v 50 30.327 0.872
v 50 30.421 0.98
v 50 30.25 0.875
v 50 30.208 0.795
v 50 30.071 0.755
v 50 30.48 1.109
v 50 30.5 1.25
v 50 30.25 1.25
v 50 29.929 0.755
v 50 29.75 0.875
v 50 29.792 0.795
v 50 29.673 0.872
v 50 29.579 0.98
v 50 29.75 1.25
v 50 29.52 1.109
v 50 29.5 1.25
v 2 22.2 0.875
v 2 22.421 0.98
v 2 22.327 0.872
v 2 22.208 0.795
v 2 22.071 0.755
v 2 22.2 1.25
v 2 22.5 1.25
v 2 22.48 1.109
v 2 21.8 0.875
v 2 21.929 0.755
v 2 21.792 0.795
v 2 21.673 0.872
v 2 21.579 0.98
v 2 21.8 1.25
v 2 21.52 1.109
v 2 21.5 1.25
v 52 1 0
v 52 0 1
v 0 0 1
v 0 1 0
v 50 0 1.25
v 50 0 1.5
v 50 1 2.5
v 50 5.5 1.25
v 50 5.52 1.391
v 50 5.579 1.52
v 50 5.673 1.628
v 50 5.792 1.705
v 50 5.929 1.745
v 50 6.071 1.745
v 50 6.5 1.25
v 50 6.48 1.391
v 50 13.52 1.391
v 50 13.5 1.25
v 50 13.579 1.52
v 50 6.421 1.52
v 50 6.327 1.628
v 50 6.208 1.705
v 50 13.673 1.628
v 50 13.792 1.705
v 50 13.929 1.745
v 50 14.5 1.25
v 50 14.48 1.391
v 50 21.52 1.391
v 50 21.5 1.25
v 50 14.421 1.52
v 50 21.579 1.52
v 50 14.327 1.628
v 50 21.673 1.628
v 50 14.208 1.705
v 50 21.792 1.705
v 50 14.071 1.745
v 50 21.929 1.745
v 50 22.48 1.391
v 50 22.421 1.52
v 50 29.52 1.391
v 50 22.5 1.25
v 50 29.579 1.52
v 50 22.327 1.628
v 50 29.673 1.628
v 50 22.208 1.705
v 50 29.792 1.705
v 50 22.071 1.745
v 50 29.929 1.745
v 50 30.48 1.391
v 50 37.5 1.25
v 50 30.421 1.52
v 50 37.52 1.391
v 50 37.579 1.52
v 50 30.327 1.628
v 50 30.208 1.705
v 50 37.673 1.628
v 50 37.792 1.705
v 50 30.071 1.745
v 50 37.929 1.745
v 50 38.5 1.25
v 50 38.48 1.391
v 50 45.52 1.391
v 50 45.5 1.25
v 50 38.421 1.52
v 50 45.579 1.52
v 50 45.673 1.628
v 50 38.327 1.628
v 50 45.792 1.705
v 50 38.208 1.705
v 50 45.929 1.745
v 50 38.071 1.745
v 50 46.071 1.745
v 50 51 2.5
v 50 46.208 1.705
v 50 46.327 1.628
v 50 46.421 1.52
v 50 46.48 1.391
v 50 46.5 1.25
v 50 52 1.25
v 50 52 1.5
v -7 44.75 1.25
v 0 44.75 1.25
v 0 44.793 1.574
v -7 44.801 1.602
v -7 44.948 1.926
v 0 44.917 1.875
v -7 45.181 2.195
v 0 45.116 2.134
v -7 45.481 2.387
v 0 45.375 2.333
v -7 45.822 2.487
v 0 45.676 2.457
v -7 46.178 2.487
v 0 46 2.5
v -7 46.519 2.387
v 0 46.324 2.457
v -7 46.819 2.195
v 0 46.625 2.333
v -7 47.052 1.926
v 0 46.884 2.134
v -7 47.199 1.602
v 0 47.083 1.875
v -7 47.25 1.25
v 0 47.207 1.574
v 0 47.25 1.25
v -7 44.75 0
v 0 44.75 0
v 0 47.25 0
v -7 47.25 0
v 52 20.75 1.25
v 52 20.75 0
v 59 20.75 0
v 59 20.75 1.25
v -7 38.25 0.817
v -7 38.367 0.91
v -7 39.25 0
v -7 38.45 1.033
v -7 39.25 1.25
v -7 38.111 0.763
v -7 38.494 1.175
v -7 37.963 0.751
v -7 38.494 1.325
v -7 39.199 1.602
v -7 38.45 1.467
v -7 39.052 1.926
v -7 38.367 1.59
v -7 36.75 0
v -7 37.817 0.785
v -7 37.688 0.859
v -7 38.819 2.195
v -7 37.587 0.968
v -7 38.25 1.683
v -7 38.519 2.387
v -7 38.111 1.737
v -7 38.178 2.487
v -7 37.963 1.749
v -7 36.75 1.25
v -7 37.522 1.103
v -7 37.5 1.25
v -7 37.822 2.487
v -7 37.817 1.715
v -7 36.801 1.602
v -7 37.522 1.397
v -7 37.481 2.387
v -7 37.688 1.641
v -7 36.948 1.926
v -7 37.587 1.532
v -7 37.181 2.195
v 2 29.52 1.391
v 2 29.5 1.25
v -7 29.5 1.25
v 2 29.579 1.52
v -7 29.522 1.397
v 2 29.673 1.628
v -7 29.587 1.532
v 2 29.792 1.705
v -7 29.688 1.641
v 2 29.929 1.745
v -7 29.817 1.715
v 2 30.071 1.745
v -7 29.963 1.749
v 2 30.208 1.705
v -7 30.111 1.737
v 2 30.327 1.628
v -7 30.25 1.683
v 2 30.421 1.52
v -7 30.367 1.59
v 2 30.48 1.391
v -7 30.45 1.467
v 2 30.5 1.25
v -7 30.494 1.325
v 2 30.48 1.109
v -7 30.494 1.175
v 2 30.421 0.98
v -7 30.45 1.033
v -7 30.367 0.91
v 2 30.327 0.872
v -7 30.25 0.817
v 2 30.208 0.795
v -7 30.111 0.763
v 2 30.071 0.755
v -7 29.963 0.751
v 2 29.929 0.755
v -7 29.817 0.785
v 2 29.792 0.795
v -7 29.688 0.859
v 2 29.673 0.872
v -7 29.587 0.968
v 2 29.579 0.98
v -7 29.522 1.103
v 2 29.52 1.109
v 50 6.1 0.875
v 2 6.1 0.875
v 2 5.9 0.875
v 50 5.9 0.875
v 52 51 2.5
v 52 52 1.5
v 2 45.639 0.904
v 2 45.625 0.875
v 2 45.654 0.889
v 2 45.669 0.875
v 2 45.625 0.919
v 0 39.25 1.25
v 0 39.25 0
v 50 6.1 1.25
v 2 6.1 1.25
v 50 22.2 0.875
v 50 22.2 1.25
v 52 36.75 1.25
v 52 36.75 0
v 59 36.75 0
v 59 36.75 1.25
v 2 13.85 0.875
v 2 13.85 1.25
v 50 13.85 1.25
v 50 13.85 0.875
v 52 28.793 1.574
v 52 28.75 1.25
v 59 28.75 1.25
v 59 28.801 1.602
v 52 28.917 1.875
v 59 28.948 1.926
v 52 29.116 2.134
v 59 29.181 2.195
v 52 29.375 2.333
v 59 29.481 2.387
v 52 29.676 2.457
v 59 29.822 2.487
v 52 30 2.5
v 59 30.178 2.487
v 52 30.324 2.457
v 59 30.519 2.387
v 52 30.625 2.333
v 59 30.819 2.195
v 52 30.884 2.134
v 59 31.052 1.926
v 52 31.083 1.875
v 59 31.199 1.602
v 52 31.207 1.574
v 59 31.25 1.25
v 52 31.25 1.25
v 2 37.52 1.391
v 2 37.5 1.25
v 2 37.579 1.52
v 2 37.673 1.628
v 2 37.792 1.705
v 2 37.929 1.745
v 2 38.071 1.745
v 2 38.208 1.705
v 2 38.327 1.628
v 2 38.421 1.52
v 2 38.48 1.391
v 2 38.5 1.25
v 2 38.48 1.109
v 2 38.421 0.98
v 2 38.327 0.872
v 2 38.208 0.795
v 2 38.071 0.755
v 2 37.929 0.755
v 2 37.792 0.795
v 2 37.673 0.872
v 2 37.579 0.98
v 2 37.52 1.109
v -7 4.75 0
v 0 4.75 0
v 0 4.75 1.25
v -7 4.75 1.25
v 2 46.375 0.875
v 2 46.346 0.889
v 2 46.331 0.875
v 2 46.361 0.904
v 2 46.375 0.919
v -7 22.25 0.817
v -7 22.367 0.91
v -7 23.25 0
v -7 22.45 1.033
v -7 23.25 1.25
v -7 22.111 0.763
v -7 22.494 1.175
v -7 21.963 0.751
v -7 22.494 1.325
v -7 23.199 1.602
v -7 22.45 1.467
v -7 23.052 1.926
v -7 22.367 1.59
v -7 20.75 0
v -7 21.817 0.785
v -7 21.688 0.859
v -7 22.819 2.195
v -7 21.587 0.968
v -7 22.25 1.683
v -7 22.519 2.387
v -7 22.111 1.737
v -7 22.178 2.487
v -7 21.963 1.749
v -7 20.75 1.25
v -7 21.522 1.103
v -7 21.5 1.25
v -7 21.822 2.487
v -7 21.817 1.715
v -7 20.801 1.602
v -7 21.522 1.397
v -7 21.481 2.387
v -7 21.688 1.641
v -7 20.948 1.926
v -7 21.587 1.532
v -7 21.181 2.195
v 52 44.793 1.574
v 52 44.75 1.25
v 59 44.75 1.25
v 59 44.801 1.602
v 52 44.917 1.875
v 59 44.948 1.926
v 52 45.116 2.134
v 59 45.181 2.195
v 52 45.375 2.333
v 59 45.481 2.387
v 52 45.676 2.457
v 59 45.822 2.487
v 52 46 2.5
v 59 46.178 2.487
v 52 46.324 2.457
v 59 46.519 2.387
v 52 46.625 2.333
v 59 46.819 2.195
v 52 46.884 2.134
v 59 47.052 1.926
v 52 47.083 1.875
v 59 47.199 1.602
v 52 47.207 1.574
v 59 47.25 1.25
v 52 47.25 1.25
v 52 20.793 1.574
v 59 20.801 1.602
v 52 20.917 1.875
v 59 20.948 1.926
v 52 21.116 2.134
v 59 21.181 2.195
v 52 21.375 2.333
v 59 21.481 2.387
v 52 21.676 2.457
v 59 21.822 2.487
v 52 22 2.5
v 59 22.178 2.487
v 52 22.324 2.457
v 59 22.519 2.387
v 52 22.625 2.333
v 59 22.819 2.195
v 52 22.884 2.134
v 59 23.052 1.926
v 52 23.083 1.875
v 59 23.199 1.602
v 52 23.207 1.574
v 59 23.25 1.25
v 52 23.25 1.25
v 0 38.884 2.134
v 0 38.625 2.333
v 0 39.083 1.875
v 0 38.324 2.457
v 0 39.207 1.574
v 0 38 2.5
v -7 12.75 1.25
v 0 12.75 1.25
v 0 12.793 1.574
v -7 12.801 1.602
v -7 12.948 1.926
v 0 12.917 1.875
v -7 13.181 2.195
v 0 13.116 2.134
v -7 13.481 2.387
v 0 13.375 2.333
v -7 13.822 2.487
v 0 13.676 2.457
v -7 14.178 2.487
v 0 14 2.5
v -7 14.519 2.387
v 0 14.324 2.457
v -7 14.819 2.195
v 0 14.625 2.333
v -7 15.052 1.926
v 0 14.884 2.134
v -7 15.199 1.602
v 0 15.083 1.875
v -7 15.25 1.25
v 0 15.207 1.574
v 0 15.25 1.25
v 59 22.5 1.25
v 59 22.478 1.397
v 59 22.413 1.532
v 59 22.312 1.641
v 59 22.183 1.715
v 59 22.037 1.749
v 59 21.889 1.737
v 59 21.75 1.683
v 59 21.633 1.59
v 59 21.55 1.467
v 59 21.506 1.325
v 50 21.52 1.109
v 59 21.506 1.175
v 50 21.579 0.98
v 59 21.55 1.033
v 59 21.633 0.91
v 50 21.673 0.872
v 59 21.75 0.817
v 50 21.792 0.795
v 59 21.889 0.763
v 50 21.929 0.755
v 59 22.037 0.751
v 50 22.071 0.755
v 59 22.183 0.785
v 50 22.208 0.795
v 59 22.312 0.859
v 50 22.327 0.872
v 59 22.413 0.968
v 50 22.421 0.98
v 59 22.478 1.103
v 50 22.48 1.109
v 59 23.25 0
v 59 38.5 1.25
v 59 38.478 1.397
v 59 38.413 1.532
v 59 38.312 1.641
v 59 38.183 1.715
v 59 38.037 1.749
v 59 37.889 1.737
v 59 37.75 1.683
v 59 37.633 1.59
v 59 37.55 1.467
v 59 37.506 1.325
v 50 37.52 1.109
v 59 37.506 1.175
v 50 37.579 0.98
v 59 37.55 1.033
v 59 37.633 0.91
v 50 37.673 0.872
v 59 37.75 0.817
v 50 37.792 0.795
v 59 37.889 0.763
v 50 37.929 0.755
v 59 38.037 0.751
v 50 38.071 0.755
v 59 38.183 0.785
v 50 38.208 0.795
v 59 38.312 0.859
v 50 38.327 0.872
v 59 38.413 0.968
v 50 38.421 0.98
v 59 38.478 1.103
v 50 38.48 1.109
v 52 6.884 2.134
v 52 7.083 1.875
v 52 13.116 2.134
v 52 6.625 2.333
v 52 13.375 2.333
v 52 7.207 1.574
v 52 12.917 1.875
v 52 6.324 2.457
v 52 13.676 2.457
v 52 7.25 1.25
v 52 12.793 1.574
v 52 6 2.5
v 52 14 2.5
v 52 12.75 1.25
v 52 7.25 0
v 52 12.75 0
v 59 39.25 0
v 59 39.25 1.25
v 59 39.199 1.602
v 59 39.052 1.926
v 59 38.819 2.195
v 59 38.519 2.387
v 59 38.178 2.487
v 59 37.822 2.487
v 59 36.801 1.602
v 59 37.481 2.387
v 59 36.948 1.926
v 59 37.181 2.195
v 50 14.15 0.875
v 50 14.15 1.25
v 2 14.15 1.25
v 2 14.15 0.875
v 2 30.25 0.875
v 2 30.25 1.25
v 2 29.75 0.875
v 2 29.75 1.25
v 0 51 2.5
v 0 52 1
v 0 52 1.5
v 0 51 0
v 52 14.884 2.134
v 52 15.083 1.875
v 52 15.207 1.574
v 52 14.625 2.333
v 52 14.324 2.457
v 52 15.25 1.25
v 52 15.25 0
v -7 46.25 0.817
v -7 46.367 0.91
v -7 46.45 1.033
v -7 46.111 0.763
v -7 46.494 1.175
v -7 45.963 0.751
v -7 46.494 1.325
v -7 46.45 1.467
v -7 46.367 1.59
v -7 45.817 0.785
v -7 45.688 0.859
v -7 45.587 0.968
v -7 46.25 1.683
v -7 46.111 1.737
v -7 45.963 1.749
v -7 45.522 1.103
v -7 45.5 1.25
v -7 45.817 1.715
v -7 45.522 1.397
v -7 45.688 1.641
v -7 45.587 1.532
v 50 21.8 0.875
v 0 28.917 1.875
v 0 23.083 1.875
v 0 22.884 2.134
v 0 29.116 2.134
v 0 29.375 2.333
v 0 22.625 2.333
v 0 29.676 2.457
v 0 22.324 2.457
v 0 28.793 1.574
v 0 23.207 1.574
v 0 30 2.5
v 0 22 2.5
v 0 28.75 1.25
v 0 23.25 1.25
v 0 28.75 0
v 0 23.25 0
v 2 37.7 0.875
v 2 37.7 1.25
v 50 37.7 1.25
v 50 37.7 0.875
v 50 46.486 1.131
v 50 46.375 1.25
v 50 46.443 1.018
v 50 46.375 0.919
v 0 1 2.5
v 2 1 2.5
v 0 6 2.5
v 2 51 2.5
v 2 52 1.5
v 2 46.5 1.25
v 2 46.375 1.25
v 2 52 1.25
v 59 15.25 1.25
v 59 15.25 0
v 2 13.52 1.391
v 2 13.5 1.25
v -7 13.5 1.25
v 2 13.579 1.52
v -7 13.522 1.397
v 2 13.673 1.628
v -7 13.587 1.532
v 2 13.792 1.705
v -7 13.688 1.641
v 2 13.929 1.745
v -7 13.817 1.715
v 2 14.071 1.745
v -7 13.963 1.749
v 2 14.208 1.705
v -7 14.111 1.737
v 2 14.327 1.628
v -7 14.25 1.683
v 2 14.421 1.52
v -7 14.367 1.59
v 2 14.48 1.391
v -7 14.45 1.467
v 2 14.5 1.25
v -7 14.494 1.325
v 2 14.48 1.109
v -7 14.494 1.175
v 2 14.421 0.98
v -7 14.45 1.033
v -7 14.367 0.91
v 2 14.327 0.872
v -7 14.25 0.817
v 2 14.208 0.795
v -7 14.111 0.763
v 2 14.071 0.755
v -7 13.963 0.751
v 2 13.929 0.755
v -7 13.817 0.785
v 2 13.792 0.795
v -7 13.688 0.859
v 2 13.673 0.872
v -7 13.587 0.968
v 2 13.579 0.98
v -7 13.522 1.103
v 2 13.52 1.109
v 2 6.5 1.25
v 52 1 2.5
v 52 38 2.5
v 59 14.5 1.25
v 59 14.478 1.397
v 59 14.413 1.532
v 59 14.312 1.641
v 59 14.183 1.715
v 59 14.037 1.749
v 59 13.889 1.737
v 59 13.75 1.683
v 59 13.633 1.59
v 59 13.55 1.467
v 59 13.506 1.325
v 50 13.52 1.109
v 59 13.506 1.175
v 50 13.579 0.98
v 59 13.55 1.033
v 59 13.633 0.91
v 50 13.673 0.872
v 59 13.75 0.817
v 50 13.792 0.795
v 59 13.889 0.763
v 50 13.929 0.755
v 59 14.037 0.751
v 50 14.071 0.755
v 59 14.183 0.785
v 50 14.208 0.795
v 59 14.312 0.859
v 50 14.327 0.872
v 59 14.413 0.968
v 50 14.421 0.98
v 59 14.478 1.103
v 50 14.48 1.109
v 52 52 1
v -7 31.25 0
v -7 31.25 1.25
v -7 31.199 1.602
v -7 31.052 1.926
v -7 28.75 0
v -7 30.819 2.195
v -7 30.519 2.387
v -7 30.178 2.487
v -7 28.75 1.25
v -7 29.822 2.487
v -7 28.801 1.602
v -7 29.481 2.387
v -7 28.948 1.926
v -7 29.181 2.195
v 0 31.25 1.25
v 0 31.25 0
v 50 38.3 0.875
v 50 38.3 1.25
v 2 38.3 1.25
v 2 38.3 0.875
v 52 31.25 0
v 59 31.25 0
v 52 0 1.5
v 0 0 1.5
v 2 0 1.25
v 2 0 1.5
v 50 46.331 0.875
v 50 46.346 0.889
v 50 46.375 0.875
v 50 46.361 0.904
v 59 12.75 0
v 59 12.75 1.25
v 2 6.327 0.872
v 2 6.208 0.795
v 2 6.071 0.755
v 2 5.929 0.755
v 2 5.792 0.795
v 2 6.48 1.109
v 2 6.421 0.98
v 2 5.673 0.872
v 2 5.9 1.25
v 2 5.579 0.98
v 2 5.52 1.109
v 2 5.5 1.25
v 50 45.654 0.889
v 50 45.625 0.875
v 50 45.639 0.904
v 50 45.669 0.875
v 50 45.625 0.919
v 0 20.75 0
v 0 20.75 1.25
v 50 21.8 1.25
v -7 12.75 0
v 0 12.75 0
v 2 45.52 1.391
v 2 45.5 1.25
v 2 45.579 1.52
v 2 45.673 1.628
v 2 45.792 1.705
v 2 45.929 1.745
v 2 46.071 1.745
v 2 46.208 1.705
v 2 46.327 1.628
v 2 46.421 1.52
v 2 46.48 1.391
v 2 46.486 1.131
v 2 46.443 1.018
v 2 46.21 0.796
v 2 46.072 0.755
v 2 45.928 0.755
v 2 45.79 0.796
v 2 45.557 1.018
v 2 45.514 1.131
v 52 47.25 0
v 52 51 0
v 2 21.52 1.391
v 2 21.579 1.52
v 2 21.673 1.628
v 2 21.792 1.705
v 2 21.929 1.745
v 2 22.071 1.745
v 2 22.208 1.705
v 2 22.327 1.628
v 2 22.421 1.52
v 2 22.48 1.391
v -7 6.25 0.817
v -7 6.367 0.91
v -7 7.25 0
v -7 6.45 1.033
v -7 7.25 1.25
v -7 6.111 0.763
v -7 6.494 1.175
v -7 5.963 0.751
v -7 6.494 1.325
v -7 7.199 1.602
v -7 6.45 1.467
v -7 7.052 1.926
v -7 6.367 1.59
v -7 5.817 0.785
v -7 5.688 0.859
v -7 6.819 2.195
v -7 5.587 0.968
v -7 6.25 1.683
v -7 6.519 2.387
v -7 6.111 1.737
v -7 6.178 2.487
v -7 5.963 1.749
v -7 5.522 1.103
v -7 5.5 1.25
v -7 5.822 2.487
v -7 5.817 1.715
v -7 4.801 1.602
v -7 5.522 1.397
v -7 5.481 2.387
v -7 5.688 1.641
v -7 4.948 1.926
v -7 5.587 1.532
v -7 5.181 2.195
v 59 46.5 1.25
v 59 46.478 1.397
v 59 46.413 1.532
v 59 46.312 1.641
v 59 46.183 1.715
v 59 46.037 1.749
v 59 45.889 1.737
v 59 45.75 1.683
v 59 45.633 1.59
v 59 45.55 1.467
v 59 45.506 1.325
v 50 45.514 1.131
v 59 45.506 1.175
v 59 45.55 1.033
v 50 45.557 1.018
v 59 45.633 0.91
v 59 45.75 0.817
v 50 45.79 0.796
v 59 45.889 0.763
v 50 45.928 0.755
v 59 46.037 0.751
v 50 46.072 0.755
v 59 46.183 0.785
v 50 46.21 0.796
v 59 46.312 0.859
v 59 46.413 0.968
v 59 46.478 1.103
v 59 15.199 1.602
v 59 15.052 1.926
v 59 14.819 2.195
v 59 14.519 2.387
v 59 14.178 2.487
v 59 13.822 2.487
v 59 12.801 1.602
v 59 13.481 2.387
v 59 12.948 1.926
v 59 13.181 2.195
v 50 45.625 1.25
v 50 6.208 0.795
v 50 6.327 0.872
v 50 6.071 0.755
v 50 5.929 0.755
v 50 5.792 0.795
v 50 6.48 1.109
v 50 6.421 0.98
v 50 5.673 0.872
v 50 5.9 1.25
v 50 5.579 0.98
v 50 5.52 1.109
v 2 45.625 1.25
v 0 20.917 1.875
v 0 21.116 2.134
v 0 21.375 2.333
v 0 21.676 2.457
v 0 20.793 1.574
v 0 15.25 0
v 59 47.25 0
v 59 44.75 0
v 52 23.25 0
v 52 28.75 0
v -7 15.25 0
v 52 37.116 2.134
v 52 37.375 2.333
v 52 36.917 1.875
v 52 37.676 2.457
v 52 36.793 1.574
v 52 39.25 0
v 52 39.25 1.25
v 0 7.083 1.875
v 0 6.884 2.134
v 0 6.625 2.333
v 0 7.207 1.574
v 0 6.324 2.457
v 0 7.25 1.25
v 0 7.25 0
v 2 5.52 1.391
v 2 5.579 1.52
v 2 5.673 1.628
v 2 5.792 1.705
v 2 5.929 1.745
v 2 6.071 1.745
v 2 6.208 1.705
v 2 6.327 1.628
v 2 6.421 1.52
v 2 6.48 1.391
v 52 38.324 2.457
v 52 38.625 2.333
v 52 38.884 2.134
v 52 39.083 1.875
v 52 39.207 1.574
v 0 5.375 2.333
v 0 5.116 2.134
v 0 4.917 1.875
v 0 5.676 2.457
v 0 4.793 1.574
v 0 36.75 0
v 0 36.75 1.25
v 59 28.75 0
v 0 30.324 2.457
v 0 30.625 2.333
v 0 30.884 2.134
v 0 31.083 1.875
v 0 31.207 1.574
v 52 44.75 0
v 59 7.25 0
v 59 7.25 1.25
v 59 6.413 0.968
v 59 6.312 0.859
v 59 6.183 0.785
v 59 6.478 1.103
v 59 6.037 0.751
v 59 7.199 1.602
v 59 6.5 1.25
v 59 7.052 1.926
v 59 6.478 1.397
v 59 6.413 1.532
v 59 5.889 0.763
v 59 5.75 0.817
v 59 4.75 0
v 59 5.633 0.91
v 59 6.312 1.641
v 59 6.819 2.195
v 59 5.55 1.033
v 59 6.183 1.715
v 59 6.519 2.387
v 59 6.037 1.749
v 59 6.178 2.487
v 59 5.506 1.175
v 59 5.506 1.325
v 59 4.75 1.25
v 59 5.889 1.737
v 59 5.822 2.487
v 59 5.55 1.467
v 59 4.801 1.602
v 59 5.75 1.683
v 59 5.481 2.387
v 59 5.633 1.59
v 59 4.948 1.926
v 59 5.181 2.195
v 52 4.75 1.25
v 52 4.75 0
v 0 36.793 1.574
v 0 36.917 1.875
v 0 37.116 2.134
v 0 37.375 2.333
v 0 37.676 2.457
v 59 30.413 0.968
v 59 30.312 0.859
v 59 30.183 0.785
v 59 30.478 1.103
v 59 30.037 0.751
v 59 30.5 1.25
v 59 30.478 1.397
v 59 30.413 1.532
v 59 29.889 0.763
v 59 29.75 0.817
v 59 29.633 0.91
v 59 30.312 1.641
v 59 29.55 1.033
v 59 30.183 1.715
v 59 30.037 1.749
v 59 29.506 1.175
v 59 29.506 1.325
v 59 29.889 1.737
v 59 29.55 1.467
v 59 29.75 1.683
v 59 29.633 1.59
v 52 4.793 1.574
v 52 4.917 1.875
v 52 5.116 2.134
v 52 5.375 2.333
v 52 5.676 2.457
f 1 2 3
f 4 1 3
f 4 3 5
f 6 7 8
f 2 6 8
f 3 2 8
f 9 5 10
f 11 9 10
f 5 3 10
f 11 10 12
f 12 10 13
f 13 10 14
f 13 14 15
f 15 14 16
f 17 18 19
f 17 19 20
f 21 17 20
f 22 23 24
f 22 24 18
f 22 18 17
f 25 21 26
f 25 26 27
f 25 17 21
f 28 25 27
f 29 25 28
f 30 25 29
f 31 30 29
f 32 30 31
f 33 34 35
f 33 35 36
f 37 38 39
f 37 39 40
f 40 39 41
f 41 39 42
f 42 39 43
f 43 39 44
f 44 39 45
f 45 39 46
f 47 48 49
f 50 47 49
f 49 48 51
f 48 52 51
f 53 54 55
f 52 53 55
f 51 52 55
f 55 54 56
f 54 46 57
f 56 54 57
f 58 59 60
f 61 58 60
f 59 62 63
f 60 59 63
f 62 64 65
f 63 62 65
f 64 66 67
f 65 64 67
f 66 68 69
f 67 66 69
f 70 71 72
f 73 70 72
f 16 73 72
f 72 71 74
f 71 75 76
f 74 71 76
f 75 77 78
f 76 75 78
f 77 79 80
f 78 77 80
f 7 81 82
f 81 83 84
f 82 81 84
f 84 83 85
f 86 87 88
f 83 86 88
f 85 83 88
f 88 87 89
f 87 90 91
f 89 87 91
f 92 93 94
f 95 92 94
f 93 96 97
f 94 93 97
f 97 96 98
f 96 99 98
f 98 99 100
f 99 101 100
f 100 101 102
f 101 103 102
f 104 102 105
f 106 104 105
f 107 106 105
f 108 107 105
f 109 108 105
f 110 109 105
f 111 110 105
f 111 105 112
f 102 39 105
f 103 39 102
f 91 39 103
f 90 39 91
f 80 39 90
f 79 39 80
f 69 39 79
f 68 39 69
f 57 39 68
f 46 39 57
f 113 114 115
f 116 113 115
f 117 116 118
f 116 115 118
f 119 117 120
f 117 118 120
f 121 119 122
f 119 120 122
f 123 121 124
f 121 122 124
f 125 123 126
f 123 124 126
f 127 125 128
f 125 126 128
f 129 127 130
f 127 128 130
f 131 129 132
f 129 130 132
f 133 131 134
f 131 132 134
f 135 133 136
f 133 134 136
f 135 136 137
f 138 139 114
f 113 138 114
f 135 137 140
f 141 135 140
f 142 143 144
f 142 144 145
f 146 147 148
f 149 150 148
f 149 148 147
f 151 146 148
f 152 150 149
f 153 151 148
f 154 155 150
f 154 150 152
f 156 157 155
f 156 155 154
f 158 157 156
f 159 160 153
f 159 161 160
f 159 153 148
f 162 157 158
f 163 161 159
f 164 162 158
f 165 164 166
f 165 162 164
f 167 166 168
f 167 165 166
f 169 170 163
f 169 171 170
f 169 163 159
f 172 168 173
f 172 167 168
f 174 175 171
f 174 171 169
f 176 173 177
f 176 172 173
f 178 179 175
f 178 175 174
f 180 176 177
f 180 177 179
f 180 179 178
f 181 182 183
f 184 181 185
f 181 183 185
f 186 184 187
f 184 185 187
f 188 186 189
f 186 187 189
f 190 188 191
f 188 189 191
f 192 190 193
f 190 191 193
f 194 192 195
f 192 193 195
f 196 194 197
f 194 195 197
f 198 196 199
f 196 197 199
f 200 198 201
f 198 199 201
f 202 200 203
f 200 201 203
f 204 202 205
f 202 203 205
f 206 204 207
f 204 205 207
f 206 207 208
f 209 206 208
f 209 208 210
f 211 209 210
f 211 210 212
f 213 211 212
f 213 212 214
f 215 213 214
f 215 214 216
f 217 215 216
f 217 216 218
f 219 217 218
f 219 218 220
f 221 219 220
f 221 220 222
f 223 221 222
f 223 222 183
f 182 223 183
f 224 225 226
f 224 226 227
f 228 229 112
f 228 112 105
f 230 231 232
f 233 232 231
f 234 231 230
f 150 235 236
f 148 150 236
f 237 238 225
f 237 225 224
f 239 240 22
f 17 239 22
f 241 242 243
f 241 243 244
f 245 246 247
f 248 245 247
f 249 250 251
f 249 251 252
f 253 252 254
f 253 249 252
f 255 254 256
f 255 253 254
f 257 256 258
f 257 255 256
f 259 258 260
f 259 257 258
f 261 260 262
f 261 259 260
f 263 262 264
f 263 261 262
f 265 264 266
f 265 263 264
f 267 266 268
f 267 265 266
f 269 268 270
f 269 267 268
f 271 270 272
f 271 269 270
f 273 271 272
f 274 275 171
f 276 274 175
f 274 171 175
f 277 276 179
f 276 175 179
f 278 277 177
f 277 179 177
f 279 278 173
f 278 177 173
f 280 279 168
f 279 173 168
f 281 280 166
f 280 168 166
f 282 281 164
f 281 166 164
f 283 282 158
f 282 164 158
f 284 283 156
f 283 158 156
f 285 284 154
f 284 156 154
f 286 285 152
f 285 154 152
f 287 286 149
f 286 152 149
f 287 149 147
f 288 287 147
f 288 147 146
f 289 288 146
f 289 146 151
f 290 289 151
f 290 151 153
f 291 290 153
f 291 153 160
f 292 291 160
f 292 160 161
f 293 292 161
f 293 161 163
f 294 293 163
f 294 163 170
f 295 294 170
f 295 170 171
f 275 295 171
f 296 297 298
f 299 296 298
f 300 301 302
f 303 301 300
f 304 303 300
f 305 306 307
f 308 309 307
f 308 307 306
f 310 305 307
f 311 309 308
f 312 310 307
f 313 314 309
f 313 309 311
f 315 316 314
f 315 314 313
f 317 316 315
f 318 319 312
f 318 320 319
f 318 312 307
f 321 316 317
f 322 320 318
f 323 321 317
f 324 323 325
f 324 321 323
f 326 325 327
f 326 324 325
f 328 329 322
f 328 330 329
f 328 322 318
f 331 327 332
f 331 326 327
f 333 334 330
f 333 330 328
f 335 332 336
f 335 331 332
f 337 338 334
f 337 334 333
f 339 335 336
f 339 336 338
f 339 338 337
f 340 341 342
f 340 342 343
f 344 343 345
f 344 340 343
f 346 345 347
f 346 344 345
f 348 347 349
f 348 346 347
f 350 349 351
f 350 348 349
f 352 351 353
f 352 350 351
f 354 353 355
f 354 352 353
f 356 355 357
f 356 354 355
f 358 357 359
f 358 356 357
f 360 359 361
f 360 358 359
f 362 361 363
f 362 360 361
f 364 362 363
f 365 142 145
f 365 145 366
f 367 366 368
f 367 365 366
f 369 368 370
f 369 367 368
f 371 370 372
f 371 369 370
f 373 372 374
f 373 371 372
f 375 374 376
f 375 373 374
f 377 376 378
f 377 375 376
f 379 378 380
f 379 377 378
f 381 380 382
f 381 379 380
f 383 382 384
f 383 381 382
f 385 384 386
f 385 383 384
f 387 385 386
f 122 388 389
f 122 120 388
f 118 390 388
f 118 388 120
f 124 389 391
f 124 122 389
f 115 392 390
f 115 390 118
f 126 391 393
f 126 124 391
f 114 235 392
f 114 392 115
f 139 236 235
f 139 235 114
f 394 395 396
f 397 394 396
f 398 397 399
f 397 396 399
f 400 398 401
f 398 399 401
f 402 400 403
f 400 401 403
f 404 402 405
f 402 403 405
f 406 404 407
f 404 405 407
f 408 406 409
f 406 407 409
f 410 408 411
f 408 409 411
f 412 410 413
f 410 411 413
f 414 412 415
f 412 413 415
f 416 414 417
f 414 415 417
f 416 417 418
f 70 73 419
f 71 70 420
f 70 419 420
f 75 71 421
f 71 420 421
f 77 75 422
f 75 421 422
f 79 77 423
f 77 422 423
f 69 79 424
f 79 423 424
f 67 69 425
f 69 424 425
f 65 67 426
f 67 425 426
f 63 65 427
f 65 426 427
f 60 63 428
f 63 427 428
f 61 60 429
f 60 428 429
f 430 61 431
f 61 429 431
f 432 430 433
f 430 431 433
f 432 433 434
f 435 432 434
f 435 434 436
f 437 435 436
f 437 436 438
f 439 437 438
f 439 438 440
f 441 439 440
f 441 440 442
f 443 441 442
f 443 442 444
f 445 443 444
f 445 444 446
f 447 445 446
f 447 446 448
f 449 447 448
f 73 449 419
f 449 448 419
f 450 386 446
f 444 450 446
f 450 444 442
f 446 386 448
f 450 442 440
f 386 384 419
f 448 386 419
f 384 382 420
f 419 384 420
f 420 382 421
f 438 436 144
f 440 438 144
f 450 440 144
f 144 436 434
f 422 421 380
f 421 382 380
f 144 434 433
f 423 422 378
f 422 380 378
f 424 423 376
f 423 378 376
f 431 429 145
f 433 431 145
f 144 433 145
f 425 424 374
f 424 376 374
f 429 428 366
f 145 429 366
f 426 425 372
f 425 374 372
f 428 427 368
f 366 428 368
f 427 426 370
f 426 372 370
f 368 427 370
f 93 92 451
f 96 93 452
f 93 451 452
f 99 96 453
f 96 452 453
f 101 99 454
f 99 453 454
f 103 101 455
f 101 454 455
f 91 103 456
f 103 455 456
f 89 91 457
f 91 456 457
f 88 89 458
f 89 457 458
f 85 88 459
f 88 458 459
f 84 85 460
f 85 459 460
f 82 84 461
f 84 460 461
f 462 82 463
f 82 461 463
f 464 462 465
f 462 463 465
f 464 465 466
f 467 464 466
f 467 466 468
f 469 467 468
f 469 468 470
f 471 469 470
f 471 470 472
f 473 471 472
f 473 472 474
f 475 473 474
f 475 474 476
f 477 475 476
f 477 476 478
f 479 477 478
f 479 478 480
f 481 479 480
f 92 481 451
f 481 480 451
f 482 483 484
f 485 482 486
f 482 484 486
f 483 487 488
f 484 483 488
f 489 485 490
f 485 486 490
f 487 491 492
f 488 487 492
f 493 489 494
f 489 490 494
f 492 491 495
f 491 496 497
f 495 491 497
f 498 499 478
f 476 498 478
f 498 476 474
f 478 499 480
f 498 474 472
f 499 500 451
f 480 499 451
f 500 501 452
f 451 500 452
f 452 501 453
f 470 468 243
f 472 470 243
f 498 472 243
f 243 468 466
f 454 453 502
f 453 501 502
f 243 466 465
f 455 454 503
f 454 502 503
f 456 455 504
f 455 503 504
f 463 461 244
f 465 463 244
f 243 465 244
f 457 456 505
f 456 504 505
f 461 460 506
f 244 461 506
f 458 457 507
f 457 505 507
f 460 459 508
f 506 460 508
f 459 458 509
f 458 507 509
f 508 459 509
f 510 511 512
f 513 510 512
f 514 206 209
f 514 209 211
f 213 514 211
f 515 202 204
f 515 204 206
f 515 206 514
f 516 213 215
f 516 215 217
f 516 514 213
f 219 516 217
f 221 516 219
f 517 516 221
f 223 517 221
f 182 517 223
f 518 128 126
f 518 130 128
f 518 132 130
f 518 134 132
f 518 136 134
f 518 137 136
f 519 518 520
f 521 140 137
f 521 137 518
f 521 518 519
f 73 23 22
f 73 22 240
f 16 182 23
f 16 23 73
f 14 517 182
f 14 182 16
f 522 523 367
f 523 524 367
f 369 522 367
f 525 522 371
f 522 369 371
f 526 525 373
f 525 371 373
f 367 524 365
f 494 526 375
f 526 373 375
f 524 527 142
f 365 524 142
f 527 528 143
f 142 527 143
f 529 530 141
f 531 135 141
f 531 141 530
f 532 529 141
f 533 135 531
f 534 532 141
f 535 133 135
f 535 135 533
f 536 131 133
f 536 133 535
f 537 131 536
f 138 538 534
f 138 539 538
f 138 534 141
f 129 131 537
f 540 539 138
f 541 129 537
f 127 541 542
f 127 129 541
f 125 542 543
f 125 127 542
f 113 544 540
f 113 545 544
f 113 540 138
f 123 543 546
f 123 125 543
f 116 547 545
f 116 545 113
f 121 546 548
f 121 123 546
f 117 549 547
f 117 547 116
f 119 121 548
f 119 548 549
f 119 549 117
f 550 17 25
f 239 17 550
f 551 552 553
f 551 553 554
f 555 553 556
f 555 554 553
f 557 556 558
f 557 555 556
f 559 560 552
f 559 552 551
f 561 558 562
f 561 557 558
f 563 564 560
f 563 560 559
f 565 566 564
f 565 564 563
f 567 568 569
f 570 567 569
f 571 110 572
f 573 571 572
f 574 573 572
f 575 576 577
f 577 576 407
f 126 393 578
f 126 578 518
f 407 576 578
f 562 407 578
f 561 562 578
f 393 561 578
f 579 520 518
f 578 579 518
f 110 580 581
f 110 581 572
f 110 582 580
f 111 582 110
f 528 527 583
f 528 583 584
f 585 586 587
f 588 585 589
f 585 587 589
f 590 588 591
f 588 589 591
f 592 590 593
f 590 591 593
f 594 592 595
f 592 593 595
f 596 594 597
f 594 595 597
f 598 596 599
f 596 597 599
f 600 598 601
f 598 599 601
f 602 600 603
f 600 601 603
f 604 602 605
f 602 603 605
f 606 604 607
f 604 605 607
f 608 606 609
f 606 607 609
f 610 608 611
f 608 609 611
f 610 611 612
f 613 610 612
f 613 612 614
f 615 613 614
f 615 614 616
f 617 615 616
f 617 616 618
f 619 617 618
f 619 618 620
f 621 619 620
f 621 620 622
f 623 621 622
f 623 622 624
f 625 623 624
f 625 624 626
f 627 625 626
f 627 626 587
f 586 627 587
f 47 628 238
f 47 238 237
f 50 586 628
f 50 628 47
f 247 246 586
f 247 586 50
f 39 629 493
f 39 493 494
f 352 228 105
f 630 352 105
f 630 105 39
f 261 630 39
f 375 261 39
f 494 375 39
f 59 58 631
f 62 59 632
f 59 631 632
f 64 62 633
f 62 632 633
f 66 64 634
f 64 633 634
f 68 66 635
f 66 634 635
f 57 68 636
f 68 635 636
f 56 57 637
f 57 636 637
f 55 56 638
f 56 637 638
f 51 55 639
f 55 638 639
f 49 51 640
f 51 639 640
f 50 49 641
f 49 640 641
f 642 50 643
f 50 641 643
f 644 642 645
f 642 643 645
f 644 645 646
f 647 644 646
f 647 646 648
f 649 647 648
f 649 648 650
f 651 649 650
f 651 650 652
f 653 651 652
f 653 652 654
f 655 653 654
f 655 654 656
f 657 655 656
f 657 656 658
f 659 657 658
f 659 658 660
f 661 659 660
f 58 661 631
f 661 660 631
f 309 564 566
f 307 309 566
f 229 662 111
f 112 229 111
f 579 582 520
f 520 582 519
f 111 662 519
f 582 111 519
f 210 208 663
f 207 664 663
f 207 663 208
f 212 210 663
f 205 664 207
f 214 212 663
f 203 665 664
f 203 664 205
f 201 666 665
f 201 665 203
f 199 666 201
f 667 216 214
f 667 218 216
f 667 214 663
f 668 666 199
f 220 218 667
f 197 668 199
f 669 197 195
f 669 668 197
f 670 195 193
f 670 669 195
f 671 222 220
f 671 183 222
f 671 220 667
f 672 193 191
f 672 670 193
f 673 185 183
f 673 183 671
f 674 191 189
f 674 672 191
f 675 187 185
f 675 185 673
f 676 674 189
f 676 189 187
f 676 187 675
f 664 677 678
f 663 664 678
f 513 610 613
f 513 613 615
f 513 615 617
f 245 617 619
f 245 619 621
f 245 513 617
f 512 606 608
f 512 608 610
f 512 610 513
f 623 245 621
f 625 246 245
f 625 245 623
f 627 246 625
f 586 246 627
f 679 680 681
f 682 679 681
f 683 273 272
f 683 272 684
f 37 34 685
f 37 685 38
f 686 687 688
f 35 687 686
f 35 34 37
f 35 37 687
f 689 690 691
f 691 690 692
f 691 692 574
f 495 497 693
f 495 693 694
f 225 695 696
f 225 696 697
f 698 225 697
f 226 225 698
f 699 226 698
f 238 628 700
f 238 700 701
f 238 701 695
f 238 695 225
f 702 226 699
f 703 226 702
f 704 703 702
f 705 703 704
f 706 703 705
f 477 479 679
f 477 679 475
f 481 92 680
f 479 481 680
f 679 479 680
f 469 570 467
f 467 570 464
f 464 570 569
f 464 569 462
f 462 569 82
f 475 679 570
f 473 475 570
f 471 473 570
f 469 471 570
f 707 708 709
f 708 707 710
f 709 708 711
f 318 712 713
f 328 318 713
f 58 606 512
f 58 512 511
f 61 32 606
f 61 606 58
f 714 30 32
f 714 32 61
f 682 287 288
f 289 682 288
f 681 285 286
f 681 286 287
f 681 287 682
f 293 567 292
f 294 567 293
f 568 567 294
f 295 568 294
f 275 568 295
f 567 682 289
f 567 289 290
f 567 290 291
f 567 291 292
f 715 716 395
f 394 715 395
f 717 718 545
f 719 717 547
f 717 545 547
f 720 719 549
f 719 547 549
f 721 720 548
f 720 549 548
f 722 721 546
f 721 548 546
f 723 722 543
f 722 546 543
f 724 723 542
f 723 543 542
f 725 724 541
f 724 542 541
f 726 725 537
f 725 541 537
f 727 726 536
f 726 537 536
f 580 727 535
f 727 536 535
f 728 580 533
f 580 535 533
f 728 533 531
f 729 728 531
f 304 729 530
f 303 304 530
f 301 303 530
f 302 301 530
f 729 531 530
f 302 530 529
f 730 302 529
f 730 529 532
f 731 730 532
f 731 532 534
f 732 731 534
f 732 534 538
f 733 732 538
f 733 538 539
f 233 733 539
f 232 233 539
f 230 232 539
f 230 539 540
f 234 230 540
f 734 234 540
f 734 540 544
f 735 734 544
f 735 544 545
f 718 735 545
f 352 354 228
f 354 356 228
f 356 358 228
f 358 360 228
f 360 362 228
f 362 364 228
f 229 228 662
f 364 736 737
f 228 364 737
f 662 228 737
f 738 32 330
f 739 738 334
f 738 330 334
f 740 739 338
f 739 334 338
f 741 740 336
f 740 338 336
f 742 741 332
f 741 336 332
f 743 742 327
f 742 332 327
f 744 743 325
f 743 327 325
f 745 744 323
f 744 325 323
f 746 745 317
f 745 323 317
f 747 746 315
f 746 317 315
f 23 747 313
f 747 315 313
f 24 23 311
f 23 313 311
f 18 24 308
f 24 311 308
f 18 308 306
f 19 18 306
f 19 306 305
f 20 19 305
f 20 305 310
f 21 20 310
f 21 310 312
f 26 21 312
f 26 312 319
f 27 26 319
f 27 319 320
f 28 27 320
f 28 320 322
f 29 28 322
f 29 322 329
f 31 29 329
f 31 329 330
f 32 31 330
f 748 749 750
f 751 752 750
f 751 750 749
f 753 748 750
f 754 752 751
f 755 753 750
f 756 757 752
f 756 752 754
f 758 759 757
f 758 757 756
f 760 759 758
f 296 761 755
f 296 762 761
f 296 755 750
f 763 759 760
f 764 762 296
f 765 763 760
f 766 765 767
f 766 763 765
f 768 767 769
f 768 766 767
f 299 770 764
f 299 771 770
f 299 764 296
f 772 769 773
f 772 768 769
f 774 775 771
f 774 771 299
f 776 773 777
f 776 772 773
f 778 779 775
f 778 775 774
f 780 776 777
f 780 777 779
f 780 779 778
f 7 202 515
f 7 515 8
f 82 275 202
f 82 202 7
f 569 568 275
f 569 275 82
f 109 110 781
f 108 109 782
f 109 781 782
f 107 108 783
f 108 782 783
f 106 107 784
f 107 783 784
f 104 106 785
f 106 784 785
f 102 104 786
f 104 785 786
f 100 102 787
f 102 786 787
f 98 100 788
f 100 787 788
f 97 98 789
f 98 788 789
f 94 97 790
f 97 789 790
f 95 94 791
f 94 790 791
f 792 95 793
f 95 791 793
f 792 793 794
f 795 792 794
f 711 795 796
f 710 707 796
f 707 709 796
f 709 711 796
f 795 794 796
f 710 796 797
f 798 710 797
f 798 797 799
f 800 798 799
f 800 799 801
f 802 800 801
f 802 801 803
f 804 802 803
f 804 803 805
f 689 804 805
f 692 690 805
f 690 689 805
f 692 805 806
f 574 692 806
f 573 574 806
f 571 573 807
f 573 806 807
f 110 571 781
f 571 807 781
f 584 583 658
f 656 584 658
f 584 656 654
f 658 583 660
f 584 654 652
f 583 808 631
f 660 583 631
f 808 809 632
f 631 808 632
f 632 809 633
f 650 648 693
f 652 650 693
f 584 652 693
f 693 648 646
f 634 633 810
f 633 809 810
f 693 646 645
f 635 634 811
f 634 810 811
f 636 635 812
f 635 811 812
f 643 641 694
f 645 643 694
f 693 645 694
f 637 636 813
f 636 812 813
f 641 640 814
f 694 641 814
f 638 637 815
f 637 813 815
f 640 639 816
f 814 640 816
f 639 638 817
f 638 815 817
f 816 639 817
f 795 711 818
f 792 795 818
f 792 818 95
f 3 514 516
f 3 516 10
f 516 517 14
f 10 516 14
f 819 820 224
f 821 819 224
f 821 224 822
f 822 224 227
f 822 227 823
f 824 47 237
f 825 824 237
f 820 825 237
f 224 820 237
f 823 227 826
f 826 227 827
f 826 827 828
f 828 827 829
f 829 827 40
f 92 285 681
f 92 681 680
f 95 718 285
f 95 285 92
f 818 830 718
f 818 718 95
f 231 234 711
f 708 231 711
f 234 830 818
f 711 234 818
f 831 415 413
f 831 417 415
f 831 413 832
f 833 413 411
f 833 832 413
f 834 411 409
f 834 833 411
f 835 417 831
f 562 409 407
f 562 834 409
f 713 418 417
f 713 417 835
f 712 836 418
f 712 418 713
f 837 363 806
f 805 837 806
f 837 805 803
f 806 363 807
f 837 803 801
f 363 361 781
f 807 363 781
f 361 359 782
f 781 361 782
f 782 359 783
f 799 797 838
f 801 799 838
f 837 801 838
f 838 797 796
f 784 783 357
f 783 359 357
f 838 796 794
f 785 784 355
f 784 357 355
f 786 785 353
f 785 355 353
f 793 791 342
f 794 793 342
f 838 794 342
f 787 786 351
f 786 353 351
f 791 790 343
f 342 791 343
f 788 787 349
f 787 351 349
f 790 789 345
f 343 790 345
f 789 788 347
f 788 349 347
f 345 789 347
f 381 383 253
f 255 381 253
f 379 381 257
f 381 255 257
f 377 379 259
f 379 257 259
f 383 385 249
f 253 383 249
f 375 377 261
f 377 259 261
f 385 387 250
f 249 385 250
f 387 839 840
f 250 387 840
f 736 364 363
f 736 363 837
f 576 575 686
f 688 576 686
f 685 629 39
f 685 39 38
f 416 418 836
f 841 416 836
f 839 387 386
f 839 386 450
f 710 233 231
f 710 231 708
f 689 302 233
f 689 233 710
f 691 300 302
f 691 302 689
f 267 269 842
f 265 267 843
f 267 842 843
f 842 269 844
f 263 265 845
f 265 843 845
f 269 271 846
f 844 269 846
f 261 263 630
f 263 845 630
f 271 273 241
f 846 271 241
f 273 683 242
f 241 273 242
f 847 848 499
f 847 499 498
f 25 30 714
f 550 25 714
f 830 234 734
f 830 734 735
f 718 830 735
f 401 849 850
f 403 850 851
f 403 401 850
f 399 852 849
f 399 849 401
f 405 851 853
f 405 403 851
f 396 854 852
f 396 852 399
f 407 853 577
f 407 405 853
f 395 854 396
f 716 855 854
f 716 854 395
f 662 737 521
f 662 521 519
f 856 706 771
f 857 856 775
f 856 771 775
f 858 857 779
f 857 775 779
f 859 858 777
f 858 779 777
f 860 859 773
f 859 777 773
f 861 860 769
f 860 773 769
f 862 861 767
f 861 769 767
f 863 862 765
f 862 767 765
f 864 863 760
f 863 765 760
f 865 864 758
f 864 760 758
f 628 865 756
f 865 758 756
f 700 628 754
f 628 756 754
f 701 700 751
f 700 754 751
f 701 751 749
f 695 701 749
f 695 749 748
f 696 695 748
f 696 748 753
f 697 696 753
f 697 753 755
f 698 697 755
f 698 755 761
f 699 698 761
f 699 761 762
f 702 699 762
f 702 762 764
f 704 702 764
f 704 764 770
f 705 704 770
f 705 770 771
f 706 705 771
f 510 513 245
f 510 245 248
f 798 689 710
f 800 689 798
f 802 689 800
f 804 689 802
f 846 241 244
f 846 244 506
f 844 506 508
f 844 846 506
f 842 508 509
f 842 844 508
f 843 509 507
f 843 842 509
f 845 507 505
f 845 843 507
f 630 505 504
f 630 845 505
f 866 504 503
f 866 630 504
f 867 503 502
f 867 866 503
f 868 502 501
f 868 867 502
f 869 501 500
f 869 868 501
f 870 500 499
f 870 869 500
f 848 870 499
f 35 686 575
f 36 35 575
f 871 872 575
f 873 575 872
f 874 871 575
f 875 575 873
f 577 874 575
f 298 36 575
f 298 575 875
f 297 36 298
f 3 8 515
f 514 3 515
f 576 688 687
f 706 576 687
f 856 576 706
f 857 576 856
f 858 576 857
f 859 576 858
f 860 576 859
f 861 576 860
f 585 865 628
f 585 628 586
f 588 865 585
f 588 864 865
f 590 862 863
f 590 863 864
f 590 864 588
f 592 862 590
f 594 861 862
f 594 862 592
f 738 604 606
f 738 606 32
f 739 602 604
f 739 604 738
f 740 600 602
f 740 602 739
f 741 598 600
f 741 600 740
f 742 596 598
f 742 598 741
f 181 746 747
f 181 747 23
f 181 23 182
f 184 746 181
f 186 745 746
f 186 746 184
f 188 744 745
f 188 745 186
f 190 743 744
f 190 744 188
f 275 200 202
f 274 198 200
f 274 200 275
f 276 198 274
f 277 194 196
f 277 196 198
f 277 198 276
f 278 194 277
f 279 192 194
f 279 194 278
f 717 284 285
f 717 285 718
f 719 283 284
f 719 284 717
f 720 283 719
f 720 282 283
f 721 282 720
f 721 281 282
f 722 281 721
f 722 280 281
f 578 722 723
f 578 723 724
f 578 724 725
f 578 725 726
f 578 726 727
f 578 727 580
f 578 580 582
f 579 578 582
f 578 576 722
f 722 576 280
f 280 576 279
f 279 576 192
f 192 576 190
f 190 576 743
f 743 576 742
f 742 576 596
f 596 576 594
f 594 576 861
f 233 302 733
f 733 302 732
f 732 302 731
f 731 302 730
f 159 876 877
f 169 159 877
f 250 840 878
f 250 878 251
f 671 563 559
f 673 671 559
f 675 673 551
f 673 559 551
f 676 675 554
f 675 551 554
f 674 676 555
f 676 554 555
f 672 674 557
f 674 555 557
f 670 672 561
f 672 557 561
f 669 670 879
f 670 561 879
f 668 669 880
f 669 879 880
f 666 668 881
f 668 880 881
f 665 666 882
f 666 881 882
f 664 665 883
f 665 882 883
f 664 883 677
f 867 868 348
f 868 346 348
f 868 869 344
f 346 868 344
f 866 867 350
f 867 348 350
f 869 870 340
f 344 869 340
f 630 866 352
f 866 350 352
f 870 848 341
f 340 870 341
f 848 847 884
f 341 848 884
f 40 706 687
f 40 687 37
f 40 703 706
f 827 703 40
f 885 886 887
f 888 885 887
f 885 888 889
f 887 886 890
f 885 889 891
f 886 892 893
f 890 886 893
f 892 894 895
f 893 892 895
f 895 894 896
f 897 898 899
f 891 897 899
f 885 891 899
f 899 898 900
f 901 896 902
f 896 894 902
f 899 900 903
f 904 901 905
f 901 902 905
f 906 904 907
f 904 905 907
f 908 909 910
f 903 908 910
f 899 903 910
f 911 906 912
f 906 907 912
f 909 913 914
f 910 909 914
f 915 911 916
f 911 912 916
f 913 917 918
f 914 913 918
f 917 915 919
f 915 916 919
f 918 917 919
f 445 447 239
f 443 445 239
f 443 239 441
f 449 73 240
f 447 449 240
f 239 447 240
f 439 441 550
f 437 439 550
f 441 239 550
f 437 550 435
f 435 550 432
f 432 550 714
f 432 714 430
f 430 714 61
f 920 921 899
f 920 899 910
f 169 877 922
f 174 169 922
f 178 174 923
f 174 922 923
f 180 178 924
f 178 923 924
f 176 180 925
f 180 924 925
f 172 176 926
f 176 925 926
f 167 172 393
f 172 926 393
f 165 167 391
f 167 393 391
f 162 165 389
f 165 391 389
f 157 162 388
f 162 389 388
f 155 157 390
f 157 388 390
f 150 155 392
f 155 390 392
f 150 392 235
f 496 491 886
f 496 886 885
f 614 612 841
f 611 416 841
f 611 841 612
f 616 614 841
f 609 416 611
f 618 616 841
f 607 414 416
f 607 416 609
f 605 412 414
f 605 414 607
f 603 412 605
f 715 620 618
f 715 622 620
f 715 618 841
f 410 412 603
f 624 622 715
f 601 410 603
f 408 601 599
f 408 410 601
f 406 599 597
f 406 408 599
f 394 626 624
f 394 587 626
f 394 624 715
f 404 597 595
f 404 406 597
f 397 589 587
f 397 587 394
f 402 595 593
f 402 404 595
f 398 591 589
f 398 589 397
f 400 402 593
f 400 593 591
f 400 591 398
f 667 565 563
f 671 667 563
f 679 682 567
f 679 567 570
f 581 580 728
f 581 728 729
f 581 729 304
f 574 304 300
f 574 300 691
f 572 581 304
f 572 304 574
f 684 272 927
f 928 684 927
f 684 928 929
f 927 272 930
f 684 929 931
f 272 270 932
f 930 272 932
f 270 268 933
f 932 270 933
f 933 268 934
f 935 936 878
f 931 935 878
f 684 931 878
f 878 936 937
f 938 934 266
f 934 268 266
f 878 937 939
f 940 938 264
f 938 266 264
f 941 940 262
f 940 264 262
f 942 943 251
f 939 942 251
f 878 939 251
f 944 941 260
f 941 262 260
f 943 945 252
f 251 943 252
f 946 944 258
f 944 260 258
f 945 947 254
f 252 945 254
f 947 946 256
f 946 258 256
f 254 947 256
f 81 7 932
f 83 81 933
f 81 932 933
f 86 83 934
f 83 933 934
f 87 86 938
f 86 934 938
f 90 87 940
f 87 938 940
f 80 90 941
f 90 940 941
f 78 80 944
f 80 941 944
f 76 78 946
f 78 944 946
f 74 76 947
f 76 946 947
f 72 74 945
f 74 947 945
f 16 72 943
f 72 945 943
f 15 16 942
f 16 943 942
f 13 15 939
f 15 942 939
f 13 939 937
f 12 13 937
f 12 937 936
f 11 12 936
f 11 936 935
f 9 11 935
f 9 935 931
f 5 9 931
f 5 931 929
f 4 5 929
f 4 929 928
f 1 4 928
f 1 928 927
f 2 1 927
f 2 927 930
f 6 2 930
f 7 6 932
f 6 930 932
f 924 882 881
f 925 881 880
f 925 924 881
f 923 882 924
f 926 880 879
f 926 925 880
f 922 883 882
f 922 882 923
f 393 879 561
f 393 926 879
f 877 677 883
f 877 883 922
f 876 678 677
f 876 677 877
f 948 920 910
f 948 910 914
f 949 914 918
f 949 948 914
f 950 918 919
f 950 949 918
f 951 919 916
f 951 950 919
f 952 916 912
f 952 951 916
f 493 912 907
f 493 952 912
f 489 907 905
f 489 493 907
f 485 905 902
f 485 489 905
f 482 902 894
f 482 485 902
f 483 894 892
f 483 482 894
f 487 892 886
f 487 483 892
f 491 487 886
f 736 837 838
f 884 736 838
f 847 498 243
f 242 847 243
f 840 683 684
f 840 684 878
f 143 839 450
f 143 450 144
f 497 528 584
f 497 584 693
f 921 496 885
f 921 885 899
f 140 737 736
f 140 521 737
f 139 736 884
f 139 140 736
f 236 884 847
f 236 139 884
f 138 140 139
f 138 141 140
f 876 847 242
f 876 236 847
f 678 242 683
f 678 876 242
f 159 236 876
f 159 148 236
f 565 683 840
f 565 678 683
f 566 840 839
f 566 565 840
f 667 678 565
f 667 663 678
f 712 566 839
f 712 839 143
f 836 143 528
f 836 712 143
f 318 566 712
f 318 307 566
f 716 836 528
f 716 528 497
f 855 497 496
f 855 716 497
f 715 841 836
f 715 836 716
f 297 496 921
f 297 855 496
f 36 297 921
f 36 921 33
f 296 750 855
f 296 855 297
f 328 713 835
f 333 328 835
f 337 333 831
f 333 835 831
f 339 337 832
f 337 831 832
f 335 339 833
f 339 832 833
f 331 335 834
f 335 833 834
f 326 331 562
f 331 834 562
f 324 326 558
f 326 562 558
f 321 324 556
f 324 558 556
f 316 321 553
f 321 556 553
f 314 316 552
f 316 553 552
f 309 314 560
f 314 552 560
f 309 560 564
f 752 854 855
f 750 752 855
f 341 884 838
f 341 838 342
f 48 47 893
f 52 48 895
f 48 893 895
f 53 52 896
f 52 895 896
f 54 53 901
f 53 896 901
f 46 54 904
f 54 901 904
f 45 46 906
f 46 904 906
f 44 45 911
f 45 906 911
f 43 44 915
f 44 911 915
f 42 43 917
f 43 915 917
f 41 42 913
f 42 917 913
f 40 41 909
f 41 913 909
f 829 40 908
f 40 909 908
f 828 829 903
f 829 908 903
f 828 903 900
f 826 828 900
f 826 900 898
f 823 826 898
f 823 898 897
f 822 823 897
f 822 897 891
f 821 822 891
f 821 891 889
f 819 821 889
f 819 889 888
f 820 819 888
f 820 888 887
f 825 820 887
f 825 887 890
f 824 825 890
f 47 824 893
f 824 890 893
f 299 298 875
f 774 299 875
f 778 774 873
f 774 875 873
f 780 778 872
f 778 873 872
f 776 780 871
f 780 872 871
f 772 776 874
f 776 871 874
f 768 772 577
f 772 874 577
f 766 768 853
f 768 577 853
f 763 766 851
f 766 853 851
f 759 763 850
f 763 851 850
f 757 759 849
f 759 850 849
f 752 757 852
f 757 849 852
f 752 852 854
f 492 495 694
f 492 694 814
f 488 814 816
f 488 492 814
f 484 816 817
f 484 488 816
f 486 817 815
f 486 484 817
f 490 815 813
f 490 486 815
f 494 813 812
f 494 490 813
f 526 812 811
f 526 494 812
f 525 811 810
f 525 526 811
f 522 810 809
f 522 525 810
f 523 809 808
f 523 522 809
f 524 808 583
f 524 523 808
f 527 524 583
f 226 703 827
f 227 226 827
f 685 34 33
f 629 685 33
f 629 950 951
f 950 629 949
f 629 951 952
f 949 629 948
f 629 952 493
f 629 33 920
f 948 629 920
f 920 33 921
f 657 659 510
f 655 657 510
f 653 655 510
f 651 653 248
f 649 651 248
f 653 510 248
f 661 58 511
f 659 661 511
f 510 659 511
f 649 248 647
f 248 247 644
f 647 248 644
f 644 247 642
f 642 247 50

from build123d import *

# Parameters (mm, degrees)
F0_W      = 70
F0_H      = 52
F1_DEPTH  = 2.5
F2_R      = 0.5
F3_DEPTH  = 2
F5_DEPTH  = 7
F6_W      = 44
F6_H      = 52
F7_DEPTH  = 25
F10_W     = 48
F10_H     = 52
F11_DEPTH = 1.25
F12_W     = 48
F12_H     = 0.2
F12_H_2   = 0.75
F13_DEPTH = 0.375
F15_DEPTH = 60
F16_R     = 0.5
F17_DEPTH = 9
F18_R     = 0.5
F19_DEPTH = 9


# Not quite as in the source:
# - a feature names something its author has since deleted; it is built from what else it names


with BuildPart() as f1:
    # F0 (on Top) → F1 (new body)
    with BuildSketch(Plane.XY):
        with Locations((35, 26)):
            Rectangle(F0_W, F0_H)
    extrude(amount=F1_DEPTH)

    # F2 (on face) → F3 (cut)
    with BuildSketch(Plane(origin=(0, 0, 0), x_dir=(0, -1, 0), z_dir=(-1, 0, 0))):
        with Locations((-46, 1.25)):
            Circle(F2_R)
        with Locations((-38, 1.25)):
            Circle(F2_R)
        with Locations((-30, 1.25)):
            Circle(F2_R)
        with Locations((-22, 1.25)):
            Circle(F2_R)
        with Locations((-14, 1.25)):
            Circle(F2_R)
        with Locations((-6, 1.25)):
            Circle(F2_R)
    extrude(amount=-F3_DEPTH, mode=Mode.SUBTRACT)

    # F4 (on face) → F5 (join)
    with BuildSketch(Plane(origin=(0, 0, 0), x_dir=(0, -1, 0), z_dir=(-1, 0, 0))):
        with BuildLine():
            Line((-44.75, 0), (-44.75, 1.25))
            ThreePointArc((-44.75, 1.25), (-46, 2.5), (-47.25, 1.25))
            Line((-47.25, 1.25), (-47.25, 0))
            Line((-47.25, 0), (-44.75, 0))
        make_face()
        with BuildLine():
            Line((-36.75, 0), (-36.75, 1.25))
            ThreePointArc((-36.75, 1.25), (-38, 2.5), (-39.25, 1.25))
            Line((-39.25, 1.25), (-39.25, 0))
            Line((-39.25, 0), (-36.75, 0))
        make_face()
        with BuildLine():
            Line((-28.75, 0), (-28.75, 1.25))
            ThreePointArc((-28.75, 1.25), (-30, 2.5), (-31.25, 1.25))
            Line((-31.25, 1.25), (-31.25, 0))
            Line((-31.25, 0), (-28.75, 0))
        make_face()
        with BuildLine():
            Line((-20.75, 0), (-20.75, 1.25))
            ThreePointArc((-20.75, 1.25), (-22, 2.5), (-23.25, 1.25))
            Line((-23.25, 1.25), (-23.25, 0))
            Line((-23.25, 0), (-20.75, 0))
        make_face()
        with BuildLine():
            Line((-12.75, 0), (-12.75, 1.25))
            ThreePointArc((-12.75, 1.25), (-14, 2.5), (-15.25, 1.25))
            Line((-15.25, 1.25), (-15.25, 0))
            Line((-15.25, 0), (-12.75, 0))
        make_face()
        with BuildLine():
            Line((-4.75, 0), (-4.75, 1.25))
            ThreePointArc((-4.75, 1.25), (-6, 2.5), (-7.25, 1.25))
            Line((-7.25, 1.25), (-7.25, 0))
            Line((-7.25, 0), (-4.75, 0))
        make_face()
    extrude(amount=F5_DEPTH)

    # F6 (on face) → F7 (cut)
    with BuildSketch(Plane.XY.offset(2.5)):
        with Locations((48, 26)):
            Rectangle(F6_W, F6_H)
    extrude(amount=-F7_DEPTH, mode=Mode.SUBTRACT)

    # F9: F1 across plane


with BuildPart() as f1_1:
    add(f1.part)
    add(f1.part.mirror(Plane(origin=(26, 26, 1.25), x_dir=(0, 1, 0), z_dir=(1, 0, 0))))

    # F10 (on face) → F11 (cut)
    with BuildSketch(Plane.XY.offset(2.5)):
        with Locations((26, 26)):
            Rectangle(F10_W, F10_H)
    extrude(amount=-F11_DEPTH, mode=Mode.SUBTRACT)

    # F12 (on face) → F13 (cut)
    with BuildSketch(Plane.XY.offset(1.25)):
        with Locations((26, 6)):
            Rectangle(F12_W, F12_H)
        with Locations((26, 46)):
            Rectangle(F12_W, F12_H_2)
        Polygon((2, 14.15), (2, 14), (2, 13.85), (50, 13.85), (50, 14.15), align=None)
        Polygon((2, 22.2), (2, 22), (2, 21.8), (50, 21.8), (50, 22.2), align=None)
        Polygon((2, 30.25), (2, 30), (2, 29.75), (50, 29.75), (50, 30.25), align=None)
        Polygon((2, 38.3), (2, 38), (2, 37.7), (50, 37.7), (50, 38.3), align=None)
    extrude(amount=-F13_DEPTH, mode=Mode.SUBTRACT)

    # F14 (on face) → F15 (cut)
    with BuildSketch(Plane(origin=(0, 0, 0), x_dir=(0, -1, 0), z_dir=(-1, 0, 0))):
        Polygon((-51, 2.5), (-52, 2.5), (-52, 1.5), align=None)
        Polygon((-52, 1), (-52, 0), (-51, 0), align=None)
        Polygon((-1, 0), (0, 0), (0, 1), align=None)
        Polygon((0, 1.5), (0, 2.5), (-1, 2.5), align=None)
    extrude(amount=-F15_DEPTH, mode=Mode.SUBTRACT)

    # F16 (on face) → F17 (cut)
    with BuildSketch(Plane(origin=(-7, 0, 0), x_dir=(0, -1, 0), z_dir=(-1, 0, 0))):
        with Locations((-46, 1.25)):
            Circle(F16_R)
        with Locations((-38, 1.25)):
            Circle(F16_R)
        with Locations((-30, 1.25)):
            Circle(F16_R)
        with Locations((-22, 1.25)):
            Circle(F16_R)
        with Locations((-14, 1.25)):
            Circle(F16_R)
        with Locations((-6, 1.25)):
            Circle(F16_R)
    extrude(amount=-F17_DEPTH, mode=Mode.SUBTRACT)

    # F18 (on face) → F19 (cut)
    with BuildSketch(Plane.YZ.offset(59)):
        with Locations((6, 1.25)):
            Circle(F18_R)
        with Locations((14, 1.25)):
            Circle(F18_R)
        with Locations((22, 1.25)):
            Circle(F18_R)
        with Locations((30, 1.25)):
            Circle(F18_R)
        with Locations((38, 1.25)):
            Circle(F18_R)
        with Locations((46, 1.25)):
            Circle(F18_R)
    extrude(amount=-F19_DEPTH, mode=Mode.SUBTRACT)


solid = f1_1.part
